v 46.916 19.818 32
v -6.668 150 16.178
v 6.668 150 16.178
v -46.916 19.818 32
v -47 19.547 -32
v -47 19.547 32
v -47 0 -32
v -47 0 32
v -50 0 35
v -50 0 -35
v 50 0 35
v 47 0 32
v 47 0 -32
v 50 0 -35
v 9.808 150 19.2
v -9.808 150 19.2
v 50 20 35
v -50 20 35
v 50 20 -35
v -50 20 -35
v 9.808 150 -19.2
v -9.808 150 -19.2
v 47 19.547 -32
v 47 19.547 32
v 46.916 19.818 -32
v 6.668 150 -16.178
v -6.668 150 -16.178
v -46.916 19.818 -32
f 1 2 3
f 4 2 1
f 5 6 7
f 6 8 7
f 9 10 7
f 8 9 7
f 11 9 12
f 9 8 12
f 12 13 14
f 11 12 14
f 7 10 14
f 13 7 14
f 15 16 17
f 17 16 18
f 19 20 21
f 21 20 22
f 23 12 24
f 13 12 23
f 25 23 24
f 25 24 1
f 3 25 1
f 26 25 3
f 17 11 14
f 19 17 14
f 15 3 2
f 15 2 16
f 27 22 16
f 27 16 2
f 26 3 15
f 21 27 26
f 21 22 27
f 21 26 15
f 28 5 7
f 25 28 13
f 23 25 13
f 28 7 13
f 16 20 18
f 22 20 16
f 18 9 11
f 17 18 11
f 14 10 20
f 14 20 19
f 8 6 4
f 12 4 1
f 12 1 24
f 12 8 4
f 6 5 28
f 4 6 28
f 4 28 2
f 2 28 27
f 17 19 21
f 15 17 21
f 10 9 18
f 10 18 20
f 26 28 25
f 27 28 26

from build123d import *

# Parameters (mm, degrees)
SKETCH2_W               = 100
SKETCH2_H               = 70
BOSS_EXTRUDE1_DEPTH     = 150
CUT_EXTRUDE1_DEPTH      = 184.643676722
CUT_EXTRUDE2_DEPTH      = 162.941347407
CUT_EXTRUDE2_DEPTH_BACK = 162.941347407
SHELL1_T                = -3


with BuildPart() as part:
    # Sketch2 → Boss-Extrude1 (new body)
    with BuildSketch(Plane(origin=(0, 0, 0), x_dir=(1, 0, 0), z_dir=(0, 1, 0))):
        Rectangle(SKETCH2_W, SKETCH2_H)
    extrude(amount=BOSS_EXTRUDE1_DEPTH)

    # Sketch3 → Cut-Extrude1 (cut, through all)
    with BuildSketch(Plane.ZY.offset(50)):
        Polygon((-35, 20), (-19.2, 150), (-35, 150), align=None)
        Polygon((19.2, 150), (35, 20), (35, 150), align=None)
    extrude(amount=-CUT_EXTRUDE1_DEPTH, mode=Mode.SUBTRACT)

    # Sketch4 → Cut-Extrude2 (cut, two sides: drawn at the far end of the back side and taken through both)
    with BuildSketch(Plane.XY.offset(-CUT_EXTRUDE2_DEPTH_BACK)):
        Polygon((-50, 20), (-9.808333333, 150), (-50, 150), align=None)
        Polygon((50, 20), (9.808333333, 150), (50, 150), align=None)
    extrude(amount=CUT_EXTRUDE2_DEPTH + CUT_EXTRUDE2_DEPTH_BACK, mode=Mode.SUBTRACT)

    # Shell1
    shell1_openings = [part.faces().sort_by_distance(p)[0] for p in [
        (0, 150, 0),
        (0, 0, 0),
    ]]
    offset(amount=SHELL1_T, openings=shell1_openings, kind=Kind.INTERSECTION)


solid = part.part
